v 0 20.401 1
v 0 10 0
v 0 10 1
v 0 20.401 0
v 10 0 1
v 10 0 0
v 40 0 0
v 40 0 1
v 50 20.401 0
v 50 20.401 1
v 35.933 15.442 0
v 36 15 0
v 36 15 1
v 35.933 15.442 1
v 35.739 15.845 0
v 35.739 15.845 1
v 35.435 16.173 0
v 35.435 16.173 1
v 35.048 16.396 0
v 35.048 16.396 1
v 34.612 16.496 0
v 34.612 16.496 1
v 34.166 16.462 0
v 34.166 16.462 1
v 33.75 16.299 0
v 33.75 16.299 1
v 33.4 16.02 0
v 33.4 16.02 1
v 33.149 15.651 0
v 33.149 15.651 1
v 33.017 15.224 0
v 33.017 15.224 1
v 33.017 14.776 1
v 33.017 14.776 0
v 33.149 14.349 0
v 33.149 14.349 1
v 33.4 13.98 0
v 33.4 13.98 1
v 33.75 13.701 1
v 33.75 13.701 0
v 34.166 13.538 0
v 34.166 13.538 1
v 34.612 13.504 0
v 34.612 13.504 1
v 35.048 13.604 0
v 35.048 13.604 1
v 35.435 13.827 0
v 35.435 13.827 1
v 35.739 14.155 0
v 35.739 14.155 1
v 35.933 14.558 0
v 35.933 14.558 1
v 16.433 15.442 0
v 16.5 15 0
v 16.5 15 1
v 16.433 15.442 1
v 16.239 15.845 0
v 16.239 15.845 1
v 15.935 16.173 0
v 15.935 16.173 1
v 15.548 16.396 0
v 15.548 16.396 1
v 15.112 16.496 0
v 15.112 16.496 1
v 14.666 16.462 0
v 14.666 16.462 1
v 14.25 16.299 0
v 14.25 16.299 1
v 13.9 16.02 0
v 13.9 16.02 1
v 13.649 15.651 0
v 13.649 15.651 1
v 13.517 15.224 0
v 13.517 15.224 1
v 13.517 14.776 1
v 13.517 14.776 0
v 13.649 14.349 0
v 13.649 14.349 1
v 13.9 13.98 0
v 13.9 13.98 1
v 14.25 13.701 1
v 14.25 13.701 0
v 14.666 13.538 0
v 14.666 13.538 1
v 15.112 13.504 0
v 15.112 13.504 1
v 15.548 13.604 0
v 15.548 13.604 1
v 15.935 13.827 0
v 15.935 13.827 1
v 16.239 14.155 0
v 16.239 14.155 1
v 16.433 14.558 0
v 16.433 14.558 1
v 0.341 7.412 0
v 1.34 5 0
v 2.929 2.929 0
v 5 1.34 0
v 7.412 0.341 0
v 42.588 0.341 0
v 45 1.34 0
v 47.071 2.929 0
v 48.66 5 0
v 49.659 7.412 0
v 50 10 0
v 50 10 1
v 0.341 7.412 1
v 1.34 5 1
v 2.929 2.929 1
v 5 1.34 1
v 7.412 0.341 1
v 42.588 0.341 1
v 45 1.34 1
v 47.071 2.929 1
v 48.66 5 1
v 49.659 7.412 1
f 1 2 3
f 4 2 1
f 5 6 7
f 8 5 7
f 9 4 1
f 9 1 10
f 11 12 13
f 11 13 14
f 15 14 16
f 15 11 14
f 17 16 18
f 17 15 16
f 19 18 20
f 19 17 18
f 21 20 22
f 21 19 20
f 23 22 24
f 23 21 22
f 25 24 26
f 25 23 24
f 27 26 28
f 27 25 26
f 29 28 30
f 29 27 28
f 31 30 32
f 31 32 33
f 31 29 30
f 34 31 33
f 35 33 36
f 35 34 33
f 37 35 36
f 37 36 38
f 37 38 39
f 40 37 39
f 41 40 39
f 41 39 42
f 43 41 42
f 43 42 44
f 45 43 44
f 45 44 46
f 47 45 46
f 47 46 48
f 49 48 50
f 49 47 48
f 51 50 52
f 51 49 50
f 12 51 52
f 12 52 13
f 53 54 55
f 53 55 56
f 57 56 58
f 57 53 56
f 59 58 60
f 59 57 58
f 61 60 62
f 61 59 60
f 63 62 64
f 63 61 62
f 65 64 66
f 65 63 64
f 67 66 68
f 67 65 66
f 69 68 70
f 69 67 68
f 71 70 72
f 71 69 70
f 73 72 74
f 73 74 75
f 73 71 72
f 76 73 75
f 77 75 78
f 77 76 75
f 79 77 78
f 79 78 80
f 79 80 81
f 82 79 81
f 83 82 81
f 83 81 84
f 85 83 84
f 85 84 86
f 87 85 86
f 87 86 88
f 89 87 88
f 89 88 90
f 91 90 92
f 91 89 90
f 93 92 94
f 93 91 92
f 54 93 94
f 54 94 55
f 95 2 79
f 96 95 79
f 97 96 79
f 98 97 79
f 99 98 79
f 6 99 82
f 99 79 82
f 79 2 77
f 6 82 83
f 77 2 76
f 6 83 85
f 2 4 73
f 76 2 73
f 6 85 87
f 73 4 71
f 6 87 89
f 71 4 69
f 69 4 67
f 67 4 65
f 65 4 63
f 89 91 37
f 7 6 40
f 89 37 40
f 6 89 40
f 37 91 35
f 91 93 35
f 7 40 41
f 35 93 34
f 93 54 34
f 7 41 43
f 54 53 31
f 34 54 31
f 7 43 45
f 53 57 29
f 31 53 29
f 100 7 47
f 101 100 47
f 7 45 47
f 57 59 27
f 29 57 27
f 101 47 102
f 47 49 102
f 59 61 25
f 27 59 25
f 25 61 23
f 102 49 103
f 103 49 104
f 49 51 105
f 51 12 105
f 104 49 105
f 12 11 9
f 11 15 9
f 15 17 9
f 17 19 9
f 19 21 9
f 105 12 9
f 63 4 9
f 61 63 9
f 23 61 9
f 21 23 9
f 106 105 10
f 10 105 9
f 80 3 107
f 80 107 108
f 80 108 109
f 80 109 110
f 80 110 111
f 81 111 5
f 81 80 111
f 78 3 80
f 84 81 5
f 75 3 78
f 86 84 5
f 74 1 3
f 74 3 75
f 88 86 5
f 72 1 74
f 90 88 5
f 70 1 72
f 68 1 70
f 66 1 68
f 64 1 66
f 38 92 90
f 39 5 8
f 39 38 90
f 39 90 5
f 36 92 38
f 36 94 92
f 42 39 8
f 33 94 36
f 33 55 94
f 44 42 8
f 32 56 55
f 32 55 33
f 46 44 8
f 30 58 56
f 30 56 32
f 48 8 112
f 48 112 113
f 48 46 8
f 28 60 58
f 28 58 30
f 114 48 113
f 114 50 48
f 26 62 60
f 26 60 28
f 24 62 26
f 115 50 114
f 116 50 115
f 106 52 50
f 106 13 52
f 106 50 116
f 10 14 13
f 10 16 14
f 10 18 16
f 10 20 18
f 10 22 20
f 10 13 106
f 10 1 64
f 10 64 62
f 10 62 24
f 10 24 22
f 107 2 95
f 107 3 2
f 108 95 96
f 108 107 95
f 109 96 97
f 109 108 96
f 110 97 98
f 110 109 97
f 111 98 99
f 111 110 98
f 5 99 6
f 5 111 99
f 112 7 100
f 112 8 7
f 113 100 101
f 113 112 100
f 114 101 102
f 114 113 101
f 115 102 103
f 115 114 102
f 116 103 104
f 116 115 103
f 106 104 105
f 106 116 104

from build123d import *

# Parameters (mm, degrees)
SKETCH1_W           = 50
SKETCH1_H           = 20.400620127
SKETCH1_R           = 1.5
BOSS_EXTRUDE1_DEPTH = 1
FILLET3_R           = 10
FILLET5_R           = 10


with BuildPart() as part:
    # Sketch1 → Boss-Extrude1 (new body)
    with BuildSketch(Plane.XY):
        with Locations((25, 10.200310063)):
            Rectangle(SKETCH1_W, SKETCH1_H)
        with Locations((15, 15)):
            Circle(SKETCH1_R, mode=Mode.SUBTRACT)
        with Locations((34.5, 15)):
            Circle(SKETCH1_R, mode=Mode.SUBTRACT)
    extrude(amount=BOSS_EXTRUDE1_DEPTH)

    # Fillet3
    fillet3_edges = [part.edges().sort_by_distance(p)[0] for p in [
        (0, 0, 0.5),
    ]]
    fillet(fillet3_edges, radius=FILLET3_R)

    # Fillet5
    fillet5_edges = [part.edges().sort_by_distance(p)[0] for p in [
        (50, 0, 0.5),
    ]]
    fillet(fillet5_edges, radius=FILLET5_R)


solid = part.part
